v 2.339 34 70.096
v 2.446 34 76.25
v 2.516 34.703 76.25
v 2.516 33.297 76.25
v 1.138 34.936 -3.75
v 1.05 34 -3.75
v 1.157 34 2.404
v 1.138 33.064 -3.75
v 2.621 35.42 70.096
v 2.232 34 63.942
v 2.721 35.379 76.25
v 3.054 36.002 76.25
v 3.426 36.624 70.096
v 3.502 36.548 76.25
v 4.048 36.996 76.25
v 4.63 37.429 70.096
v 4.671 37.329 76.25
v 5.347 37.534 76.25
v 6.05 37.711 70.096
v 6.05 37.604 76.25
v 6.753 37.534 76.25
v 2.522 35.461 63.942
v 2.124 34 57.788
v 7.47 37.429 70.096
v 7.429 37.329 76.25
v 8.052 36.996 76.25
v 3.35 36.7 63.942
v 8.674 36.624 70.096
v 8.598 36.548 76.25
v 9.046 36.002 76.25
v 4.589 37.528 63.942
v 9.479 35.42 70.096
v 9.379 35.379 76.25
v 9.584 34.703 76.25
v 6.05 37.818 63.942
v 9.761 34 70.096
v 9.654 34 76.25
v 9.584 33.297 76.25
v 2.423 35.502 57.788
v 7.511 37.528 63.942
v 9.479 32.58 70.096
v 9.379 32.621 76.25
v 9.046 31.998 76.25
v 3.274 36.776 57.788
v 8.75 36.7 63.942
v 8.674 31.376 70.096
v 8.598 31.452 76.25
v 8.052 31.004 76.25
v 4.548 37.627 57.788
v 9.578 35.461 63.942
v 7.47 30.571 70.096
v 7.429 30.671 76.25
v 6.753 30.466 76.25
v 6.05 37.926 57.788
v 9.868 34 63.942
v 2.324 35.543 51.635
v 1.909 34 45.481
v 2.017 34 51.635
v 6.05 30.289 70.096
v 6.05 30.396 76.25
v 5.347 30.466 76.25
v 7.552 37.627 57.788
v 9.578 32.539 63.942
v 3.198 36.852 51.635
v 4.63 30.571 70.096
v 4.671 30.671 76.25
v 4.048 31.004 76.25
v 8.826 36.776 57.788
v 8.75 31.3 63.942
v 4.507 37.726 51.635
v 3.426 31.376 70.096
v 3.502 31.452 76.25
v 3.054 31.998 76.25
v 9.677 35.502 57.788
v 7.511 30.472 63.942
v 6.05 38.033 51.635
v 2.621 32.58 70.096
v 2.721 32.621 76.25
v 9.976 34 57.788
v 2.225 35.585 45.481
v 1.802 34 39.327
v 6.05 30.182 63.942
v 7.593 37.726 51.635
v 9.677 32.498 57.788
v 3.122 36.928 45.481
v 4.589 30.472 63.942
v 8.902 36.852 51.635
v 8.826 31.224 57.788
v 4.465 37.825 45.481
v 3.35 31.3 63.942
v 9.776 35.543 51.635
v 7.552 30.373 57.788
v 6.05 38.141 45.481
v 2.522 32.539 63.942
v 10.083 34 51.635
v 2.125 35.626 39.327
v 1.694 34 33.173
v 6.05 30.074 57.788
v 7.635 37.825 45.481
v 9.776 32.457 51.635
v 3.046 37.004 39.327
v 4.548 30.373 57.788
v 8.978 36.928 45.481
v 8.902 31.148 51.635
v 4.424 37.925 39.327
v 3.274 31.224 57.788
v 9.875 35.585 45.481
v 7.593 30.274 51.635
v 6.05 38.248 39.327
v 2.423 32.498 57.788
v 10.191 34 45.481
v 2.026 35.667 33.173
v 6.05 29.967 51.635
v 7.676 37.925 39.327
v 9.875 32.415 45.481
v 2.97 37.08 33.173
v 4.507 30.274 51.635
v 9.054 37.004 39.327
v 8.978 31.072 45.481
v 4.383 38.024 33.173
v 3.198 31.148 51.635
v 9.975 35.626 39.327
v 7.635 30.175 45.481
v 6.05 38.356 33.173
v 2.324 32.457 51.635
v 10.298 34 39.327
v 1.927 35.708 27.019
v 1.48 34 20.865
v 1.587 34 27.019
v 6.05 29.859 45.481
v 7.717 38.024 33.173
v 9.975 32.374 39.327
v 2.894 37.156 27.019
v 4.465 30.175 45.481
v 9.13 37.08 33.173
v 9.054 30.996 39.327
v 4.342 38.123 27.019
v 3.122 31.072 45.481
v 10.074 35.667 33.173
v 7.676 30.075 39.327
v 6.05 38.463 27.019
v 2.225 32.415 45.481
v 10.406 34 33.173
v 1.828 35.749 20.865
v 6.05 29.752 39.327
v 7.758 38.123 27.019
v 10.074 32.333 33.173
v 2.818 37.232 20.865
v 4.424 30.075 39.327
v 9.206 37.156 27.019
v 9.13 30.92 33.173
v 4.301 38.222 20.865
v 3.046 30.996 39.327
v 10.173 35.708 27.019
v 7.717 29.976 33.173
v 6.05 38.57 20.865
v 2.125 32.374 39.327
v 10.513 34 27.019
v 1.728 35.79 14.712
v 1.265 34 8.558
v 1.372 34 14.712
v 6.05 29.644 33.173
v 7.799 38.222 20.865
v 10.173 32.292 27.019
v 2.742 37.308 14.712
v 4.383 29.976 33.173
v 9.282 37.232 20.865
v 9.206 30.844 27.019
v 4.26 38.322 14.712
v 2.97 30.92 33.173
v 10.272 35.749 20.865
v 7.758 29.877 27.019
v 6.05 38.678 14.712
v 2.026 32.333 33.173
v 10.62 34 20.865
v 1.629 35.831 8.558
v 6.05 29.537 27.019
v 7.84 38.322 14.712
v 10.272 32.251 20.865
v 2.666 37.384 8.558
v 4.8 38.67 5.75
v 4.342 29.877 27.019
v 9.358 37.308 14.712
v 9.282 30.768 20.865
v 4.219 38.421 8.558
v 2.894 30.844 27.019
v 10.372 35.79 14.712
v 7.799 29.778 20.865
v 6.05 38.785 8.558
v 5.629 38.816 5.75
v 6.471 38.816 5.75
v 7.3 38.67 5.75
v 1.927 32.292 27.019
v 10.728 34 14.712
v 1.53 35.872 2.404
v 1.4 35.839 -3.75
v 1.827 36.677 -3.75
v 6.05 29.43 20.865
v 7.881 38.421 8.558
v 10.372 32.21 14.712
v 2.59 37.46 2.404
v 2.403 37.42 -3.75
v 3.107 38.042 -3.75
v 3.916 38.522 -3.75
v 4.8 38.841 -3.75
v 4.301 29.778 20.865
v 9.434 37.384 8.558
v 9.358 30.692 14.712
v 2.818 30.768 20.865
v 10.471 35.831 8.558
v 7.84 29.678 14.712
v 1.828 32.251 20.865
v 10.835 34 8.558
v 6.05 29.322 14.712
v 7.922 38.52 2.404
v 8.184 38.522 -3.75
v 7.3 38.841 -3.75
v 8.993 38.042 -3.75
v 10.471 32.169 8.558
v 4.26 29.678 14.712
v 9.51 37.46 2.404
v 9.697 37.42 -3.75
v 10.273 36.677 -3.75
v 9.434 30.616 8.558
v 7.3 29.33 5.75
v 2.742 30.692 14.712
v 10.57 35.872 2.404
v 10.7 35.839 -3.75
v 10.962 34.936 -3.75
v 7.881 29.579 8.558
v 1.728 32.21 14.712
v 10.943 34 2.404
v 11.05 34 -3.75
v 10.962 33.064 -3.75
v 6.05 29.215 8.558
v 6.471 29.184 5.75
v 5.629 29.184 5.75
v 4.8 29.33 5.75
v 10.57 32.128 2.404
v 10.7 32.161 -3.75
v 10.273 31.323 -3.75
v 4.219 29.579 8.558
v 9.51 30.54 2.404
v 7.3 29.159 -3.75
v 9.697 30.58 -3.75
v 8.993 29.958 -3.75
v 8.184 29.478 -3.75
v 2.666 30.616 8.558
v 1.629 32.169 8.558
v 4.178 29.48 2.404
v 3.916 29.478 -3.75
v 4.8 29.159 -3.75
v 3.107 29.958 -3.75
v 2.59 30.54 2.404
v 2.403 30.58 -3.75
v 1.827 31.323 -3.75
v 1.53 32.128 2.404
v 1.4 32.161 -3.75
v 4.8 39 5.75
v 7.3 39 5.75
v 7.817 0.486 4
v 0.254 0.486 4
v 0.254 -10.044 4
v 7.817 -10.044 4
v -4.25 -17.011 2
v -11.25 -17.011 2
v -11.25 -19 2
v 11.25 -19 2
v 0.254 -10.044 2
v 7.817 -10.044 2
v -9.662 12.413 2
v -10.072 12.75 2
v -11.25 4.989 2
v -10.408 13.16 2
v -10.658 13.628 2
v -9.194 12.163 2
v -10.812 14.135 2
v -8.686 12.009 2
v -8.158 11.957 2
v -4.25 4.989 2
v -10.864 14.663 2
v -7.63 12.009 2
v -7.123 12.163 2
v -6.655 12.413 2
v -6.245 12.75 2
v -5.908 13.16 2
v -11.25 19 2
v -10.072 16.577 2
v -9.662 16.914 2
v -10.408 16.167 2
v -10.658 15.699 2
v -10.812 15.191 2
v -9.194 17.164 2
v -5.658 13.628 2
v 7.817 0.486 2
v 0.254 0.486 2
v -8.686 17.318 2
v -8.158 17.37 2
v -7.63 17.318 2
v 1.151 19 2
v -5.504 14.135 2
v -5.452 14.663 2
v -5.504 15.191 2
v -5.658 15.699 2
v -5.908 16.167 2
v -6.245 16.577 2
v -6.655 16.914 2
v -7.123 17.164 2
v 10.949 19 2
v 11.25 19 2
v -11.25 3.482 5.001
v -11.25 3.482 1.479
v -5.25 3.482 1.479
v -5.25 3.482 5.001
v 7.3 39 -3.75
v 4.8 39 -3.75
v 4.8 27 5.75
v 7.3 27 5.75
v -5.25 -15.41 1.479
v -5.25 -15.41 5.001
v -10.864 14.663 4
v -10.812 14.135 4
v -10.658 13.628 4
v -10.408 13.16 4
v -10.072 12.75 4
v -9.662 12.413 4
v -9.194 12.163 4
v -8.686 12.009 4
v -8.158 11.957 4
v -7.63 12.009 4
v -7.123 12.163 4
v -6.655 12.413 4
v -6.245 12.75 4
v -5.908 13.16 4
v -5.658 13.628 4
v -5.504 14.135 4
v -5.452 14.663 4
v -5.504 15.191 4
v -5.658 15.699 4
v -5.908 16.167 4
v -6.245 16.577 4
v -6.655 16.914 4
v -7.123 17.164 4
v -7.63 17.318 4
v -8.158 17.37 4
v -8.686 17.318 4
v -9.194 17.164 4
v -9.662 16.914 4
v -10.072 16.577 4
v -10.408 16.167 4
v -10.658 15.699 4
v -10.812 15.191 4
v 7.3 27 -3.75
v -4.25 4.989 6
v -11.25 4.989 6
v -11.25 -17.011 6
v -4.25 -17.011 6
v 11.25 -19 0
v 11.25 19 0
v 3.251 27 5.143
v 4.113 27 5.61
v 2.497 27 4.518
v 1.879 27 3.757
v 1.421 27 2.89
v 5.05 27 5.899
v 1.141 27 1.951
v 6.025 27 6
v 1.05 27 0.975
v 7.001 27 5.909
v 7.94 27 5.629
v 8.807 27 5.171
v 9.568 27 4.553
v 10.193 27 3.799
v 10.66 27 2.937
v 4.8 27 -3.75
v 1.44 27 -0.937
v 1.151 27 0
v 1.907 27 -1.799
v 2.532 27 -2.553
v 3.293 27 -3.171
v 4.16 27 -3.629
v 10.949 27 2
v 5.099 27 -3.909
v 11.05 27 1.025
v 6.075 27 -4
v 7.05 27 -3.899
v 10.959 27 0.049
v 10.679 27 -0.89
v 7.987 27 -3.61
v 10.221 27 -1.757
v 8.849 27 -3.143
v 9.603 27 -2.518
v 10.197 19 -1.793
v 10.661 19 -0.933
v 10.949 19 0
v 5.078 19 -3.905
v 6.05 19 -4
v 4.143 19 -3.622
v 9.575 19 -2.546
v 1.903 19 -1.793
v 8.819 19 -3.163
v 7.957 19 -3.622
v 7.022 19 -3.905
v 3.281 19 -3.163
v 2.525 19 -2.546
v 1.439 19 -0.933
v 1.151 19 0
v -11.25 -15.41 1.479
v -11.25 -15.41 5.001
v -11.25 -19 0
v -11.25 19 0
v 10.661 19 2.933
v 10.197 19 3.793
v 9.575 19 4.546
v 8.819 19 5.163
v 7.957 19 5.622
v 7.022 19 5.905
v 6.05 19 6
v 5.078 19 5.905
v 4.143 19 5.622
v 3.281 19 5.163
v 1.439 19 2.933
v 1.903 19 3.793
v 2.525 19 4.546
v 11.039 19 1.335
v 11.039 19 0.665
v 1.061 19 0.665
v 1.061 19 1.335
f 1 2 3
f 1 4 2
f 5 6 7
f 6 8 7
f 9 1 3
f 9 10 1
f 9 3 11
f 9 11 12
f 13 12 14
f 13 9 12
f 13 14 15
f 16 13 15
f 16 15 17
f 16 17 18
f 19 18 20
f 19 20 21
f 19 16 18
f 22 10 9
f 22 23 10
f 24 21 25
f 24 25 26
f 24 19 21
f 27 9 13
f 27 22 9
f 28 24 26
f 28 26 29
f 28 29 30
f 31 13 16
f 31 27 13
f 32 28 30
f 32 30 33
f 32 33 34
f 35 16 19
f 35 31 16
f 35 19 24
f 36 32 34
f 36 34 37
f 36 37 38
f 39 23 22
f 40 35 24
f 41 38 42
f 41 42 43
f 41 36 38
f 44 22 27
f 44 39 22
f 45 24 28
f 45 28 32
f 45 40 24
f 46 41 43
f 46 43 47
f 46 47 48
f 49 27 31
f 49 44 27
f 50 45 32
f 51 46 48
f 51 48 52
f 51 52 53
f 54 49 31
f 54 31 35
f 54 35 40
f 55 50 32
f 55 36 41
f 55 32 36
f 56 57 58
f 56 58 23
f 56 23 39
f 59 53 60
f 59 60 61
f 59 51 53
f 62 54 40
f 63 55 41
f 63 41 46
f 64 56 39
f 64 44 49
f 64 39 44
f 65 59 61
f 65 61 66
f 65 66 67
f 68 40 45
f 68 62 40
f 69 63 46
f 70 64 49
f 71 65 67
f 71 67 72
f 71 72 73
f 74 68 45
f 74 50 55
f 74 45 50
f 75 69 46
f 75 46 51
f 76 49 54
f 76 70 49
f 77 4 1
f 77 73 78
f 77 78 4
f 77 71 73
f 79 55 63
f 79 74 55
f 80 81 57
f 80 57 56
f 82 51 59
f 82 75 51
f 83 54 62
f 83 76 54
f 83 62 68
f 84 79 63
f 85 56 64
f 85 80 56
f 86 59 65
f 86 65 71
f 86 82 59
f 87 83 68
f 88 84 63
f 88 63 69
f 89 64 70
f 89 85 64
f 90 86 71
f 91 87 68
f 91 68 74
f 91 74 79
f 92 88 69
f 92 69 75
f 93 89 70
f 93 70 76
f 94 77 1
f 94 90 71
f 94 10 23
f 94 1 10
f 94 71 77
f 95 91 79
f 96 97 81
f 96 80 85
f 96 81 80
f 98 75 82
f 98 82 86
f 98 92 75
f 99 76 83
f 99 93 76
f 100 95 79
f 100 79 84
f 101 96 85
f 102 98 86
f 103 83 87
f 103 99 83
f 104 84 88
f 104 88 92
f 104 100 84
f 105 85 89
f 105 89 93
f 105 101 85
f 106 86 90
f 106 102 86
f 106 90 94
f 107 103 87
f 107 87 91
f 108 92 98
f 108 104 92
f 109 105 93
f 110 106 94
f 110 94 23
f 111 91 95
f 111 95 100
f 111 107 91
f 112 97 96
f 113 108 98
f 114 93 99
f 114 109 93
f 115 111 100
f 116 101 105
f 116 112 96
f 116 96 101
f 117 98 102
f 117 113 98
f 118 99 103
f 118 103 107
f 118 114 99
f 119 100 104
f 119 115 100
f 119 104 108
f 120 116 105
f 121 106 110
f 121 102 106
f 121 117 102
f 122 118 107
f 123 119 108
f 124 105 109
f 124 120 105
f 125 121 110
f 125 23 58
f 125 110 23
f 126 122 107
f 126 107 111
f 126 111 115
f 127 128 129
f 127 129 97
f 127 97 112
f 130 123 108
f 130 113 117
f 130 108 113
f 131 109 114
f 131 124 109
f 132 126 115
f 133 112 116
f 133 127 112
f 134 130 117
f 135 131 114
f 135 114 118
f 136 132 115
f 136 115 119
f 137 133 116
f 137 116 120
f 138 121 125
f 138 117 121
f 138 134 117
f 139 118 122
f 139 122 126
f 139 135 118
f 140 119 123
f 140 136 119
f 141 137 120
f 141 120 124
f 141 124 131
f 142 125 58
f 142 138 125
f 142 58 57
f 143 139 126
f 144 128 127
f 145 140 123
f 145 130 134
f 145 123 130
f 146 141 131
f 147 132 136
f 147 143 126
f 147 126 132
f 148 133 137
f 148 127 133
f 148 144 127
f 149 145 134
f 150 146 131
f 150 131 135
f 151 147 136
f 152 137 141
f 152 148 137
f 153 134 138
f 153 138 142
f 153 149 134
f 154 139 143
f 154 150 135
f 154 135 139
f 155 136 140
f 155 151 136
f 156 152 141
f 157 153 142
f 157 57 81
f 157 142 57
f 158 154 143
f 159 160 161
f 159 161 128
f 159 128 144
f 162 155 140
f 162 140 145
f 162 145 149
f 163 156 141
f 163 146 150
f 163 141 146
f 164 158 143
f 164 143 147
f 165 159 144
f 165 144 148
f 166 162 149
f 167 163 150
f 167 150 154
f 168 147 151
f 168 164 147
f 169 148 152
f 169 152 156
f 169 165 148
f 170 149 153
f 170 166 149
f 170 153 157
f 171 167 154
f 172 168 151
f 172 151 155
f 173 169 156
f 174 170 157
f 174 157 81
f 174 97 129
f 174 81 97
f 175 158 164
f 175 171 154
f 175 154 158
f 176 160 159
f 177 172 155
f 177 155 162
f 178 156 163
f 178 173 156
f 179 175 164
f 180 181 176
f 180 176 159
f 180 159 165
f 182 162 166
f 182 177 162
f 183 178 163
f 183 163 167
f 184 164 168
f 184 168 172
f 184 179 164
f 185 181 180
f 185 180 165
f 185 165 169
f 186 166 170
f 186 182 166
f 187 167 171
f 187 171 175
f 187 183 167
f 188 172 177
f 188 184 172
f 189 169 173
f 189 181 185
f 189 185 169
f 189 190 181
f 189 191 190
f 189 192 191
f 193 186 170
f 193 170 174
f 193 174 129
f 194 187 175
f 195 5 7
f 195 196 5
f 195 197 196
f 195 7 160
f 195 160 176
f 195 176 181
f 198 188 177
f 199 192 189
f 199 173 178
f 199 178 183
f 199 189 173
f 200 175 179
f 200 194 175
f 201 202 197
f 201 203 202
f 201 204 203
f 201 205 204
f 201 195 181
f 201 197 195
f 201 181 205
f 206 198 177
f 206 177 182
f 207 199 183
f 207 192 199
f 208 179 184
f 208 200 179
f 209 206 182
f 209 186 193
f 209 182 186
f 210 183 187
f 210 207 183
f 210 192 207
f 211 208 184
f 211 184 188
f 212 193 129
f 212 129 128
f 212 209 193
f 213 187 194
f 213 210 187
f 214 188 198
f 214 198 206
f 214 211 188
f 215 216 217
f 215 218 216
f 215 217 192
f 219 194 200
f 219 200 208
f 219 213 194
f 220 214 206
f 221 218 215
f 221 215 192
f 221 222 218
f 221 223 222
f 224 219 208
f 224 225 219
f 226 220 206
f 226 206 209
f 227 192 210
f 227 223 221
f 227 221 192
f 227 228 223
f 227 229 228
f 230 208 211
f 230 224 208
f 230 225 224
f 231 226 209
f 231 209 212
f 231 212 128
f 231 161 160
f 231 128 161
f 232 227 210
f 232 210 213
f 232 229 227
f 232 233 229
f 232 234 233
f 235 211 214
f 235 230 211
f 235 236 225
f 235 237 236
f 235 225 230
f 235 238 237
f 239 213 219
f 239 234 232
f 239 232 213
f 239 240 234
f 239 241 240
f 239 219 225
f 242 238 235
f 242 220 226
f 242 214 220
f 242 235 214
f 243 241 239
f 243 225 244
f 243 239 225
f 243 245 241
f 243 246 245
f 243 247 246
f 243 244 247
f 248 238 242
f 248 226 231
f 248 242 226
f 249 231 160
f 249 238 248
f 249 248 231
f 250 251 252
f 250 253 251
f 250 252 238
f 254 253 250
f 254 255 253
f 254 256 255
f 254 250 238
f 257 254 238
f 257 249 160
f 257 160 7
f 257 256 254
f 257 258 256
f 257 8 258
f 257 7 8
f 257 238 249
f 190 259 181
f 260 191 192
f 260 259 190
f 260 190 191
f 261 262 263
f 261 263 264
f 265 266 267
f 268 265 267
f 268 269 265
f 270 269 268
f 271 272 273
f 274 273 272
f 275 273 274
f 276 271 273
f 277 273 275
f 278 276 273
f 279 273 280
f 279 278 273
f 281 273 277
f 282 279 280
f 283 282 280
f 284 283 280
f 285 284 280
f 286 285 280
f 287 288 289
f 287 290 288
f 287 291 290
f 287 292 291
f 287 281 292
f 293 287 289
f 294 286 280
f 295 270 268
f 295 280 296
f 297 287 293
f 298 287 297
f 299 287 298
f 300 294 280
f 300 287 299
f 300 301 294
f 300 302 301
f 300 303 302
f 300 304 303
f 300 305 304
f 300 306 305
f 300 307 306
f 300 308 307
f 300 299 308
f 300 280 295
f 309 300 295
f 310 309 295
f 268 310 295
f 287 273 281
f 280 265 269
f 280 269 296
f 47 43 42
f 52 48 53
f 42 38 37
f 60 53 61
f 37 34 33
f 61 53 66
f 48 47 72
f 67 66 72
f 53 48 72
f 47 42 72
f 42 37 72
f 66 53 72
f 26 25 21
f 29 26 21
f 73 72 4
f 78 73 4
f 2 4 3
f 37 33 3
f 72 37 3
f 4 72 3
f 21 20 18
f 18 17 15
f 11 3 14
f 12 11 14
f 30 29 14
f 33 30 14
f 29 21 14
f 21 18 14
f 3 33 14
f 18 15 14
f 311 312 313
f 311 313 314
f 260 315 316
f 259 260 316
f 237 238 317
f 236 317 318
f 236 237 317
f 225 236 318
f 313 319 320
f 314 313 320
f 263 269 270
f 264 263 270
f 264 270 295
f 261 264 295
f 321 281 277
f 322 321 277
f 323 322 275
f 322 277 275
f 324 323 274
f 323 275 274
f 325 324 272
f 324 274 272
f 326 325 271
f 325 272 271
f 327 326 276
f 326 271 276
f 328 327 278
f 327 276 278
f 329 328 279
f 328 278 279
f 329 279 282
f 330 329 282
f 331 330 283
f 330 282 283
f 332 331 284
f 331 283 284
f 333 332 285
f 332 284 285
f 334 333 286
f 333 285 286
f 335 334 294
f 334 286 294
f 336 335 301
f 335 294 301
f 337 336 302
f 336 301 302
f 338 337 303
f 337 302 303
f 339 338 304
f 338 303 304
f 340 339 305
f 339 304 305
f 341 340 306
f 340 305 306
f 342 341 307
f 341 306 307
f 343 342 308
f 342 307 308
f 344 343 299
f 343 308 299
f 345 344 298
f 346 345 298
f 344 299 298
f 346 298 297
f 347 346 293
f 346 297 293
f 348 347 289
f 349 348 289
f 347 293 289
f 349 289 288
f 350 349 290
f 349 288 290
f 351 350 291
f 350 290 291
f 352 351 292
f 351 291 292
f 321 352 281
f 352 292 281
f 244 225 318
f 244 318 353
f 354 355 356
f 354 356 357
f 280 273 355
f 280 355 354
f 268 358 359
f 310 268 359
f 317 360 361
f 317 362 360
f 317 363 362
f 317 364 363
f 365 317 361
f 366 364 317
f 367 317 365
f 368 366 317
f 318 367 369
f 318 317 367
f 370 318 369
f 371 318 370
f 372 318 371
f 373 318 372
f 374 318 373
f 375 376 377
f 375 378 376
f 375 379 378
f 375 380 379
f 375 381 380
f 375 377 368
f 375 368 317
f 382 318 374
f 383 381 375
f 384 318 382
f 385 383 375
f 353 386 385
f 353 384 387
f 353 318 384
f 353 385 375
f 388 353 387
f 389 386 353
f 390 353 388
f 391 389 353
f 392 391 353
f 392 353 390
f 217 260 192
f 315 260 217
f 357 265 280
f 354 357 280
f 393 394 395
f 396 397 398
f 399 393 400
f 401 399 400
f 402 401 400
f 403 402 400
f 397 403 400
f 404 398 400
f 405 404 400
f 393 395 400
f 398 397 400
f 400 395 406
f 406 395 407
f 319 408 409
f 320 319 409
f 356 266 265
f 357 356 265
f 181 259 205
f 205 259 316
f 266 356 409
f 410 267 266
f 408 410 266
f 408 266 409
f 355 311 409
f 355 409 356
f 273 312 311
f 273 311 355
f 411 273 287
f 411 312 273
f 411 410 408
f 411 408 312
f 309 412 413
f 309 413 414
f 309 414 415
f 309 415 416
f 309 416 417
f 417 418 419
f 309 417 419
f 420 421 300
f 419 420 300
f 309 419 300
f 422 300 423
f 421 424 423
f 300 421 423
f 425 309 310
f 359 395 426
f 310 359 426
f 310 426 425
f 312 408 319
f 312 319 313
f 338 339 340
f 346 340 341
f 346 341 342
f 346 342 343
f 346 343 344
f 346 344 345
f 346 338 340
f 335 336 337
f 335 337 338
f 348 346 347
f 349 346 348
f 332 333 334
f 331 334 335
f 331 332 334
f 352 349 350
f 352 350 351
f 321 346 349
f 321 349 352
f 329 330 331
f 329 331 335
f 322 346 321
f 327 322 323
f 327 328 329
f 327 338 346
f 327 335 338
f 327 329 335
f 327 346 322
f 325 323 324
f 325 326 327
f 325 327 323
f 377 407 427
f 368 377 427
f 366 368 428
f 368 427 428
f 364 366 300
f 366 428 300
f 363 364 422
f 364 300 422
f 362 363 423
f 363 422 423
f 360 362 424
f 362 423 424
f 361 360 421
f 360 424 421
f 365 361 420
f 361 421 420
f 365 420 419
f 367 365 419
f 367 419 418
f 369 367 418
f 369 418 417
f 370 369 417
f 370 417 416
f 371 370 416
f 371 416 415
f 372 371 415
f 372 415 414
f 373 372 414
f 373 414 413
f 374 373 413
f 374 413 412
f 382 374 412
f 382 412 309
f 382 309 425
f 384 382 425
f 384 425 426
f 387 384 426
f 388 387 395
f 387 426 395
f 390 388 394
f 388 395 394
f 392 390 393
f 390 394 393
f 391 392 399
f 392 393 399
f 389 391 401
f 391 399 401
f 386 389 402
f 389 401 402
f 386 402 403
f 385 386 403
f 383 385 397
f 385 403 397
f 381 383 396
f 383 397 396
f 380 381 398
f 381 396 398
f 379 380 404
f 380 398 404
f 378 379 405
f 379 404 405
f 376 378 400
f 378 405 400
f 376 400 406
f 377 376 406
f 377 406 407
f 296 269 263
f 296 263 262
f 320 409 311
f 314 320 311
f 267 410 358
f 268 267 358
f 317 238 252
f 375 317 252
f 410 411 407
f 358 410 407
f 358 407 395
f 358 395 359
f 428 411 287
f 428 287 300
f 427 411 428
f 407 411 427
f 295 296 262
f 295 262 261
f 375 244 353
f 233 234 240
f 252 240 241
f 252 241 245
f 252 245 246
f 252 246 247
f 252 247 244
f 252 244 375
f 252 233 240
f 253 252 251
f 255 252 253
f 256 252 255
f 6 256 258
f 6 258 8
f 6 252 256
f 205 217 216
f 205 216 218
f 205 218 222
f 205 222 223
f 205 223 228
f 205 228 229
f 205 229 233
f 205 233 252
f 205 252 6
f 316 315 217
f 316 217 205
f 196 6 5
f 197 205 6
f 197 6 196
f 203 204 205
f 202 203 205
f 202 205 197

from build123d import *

# Parameters (mm, degrees)
SKETCH1_W           = 22.5
SKETCH1_H           = 38
BOSS_EXTRUDE1_DEPTH = 2
SKETCH2_W           = 7
SKETCH2_H           = 22
BOSS_EXTRUDE2_DEPTH = 4
SKETCH3_R           = 2.706246926
SKETCH3_W           = 7.563295119
SKETCH3_H           = 10.529749536
BOSS_EXTRUDE3_DEPTH = 2
SKETCH4_W           = 3.522294841
SKETCH4_H           = 18.892308692
CUT_EXTRUDE1_DEPTH  = 6
SKETCH5_R           = 5
BOSS_EXTRUDE4_DEPTH = 20
SKETCH6_OUTSIDE_W   = 37.102
SKETCH6_OUTSIDE_H   = 24.602
SKETCH6_OUTSIDE_W_2 = 2.5
SKETCH6_OUTSIDE_H_2 = 9.5
CUT_EXTRUDE2_DEPTH  = 12
SKETCH7_R           = 5
BOSS_EXTRUDE5_DEPTH = 80
BOSS_EXTRUDE5_DRAFT = -1


with BuildPart() as part:
    # Sketch1 → Boss-Extrude1 (new body)
    with BuildSketch(Plane.XY):
        Rectangle(SKETCH1_W, SKETCH1_H)
    extrude(amount=BOSS_EXTRUDE1_DEPTH)

    # Sketch2 → Boss-Extrude2 (add)
    with BuildSketch(Plane.XY.offset(2)):
        with Locations((-7.75, -6.011083038)):
            Rectangle(SKETCH2_W, SKETCH2_H)
    extrude(amount=BOSS_EXTRUDE2_DEPTH)

    # Sketch3 → Boss-Extrude3 (add)
    with BuildSketch(Plane.XY.offset(2)):
        with Locations(Location((-8.15823298, 14.663341742, 0), (0, 0, 180))):
            Circle(SKETCH3_R)
        with Locations((4.035174314, -4.778762907)):
            Rectangle(SKETCH3_W, SKETCH3_H)
    extrude(amount=BOSS_EXTRUDE3_DEPTH)

    # Sketch4 → Cut-Extrude1 (cut)
    with BuildSketch(Plane.ZY.offset(11.25)):
        with Locations((3.240156467, -5.963885583)):
            Rectangle(SKETCH4_W, SKETCH4_H)
    extrude(amount=-CUT_EXTRUDE1_DEPTH, mode=Mode.SUBTRACT)

    # Sketch5 → Boss-Extrude4 (add)
    with BuildSketch(Plane(origin=(0, 19, 0), x_dir=(1, 0, 0), z_dir=(0, 1, 0))):
        with Locations(Location((6.05, -1, 0), (0, 0, 168.463040967))):
            Circle(SKETCH5_R)
    extrude(amount=BOSS_EXTRUDE4_DEPTH)

    # Sketch6 outside → Cut-Extrude2 (cut)
    with BuildSketch(Plane(origin=(0, 39, 0), x_dir=(1, 0, 0), z_dir=(0, 1, 0))):
        with Locations((0, -1)):
            Rectangle(SKETCH6_OUTSIDE_W, SKETCH6_OUTSIDE_H)
        with Locations((6.05, -1)):
            Rectangle(SKETCH6_OUTSIDE_W_2, SKETCH6_OUTSIDE_H_2, mode=Mode.SUBTRACT)
    extrude(amount=-CUT_EXTRUDE2_DEPTH, mode=Mode.SUBTRACT)


with BuildPart() as boss_extrude5_tool:
    # Sketch7 → Boss-Extrude5 (with draft: the straight prism first)
    with BuildSketch(Plane(origin=(0, 0, -3.75), x_dir=(-1, 0, 0), z_dir=(0, 0, -1))):
        with Locations((-6.05, 34)):
            Circle(SKETCH7_R)
    extrude(amount=-BOSS_EXTRUDE5_DEPTH)
    # Boss-Extrude5: the draft: its side faces are tilted about the plane it starts from
    boss_extrude5_sides = [boss_extrude5_tool.faces().sort_by_distance(p)[0] for p in [
        (11.05, 34, 36.25),
    ]]
    draft(boss_extrude5_sides, Plane(origin=(0, 0, -3.75), x_dir=(-1, 0, 0), z_dir=(0, 0, -1)), BOSS_EXTRUDE5_DRAFT)


with BuildPart() as part_1:
    add(part.part)

    # Boss-Extrude5: add boss_extrude5_tool
    add(boss_extrude5_tool.part)


solid = part_1.part
